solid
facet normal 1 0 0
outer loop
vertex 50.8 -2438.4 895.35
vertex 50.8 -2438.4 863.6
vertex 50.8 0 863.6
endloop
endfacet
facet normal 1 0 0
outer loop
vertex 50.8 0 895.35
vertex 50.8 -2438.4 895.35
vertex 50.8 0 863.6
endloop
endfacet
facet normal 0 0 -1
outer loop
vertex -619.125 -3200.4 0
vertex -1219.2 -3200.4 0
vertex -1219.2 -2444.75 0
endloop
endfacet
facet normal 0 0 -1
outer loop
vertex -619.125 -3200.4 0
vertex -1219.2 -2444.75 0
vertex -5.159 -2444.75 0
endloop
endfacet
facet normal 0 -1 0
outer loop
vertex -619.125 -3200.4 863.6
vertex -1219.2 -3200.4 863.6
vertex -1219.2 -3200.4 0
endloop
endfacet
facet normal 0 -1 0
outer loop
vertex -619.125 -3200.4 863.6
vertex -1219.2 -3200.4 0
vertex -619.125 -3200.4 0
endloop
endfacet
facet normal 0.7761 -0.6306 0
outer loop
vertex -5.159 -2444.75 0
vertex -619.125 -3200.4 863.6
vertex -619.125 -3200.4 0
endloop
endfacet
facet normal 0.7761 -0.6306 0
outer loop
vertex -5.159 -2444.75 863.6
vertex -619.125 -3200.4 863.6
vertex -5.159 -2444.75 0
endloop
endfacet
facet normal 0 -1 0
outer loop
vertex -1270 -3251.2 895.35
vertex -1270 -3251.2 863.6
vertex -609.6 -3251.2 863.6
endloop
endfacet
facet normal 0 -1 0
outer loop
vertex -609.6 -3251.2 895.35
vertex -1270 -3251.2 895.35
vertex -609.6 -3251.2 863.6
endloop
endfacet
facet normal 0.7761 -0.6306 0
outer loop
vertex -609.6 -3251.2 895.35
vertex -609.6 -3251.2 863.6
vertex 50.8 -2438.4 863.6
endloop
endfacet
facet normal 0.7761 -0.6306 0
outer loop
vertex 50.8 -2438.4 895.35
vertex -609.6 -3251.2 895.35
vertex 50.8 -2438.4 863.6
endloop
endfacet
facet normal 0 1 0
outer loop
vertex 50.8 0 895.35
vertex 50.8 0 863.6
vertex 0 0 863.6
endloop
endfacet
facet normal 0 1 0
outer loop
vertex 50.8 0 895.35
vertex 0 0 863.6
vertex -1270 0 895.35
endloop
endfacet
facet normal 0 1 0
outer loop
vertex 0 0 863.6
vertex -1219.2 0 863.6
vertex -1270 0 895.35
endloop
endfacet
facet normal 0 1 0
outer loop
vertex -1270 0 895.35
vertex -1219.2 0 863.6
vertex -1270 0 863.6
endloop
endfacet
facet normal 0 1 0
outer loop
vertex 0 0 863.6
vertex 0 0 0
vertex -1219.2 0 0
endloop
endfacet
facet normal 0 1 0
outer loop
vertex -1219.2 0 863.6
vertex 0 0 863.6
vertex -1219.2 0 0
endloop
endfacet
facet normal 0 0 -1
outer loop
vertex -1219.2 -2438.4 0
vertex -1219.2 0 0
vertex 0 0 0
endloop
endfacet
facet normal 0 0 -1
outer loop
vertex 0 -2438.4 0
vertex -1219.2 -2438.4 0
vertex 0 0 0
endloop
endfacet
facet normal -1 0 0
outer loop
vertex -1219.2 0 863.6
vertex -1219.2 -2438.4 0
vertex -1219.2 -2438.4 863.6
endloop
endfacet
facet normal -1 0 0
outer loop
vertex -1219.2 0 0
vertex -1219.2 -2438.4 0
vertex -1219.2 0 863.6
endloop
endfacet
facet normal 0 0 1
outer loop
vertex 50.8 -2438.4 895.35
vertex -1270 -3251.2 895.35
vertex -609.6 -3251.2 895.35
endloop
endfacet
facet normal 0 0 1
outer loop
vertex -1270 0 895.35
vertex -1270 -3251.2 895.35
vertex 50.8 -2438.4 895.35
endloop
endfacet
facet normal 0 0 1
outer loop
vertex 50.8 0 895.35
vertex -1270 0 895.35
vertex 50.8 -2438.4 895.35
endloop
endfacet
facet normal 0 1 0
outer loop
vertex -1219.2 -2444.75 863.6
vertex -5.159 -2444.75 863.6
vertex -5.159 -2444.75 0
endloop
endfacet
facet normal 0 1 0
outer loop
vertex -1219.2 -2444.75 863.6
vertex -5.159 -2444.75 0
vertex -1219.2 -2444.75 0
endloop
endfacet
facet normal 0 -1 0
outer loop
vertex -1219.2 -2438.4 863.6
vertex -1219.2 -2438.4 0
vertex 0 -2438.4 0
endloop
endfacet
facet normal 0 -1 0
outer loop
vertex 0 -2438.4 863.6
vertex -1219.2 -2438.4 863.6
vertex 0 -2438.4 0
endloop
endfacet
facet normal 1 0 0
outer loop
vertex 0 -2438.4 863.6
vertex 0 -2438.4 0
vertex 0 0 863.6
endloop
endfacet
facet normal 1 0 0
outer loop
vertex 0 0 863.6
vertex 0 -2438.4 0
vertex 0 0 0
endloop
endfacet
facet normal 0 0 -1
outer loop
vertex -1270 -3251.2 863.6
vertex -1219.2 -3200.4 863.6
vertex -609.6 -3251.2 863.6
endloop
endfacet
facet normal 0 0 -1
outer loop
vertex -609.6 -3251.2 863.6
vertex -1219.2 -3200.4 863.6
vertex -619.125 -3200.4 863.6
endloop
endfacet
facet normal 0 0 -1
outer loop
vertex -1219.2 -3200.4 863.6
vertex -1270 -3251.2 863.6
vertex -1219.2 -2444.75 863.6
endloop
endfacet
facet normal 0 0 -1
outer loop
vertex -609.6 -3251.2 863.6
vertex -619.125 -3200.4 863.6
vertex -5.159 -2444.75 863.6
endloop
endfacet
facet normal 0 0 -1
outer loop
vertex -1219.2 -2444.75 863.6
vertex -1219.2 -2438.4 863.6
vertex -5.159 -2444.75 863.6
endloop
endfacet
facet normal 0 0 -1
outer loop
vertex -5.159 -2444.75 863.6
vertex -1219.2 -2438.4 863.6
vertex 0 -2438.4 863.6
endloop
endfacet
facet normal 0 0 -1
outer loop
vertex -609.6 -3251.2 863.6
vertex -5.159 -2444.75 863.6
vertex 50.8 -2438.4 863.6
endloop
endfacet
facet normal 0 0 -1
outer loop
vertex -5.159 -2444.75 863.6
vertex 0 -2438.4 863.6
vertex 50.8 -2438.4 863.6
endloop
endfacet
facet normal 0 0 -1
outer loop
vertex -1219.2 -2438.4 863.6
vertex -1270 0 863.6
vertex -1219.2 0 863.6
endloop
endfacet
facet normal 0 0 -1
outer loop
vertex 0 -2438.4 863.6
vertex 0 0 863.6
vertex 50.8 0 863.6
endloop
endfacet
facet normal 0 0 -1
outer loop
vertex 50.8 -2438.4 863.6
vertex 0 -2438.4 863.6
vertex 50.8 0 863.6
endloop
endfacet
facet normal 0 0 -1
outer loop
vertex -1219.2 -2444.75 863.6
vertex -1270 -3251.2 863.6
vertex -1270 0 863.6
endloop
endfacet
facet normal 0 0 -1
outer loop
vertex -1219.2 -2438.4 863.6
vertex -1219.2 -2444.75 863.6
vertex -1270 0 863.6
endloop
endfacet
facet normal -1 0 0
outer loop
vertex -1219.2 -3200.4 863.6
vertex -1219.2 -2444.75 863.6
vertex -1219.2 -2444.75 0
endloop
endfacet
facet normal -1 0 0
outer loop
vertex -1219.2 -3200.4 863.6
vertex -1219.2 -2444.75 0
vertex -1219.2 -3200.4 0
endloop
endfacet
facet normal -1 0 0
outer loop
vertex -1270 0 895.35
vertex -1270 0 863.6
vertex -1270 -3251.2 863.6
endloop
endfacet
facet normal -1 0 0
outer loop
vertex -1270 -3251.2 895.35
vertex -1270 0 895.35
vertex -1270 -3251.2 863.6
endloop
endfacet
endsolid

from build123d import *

# Parameters (mm, degrees)
F0_W     = 1219.2
F0_H     = 2438.4
F1_DEPTH = 863.6
F2_W     = 50.8
F2_H     = 2438.4
F2_W_2   = 1219.2
F3_DEPTH = 31.75
F5_DEPTH = 31.75
F6_DEPTH = 863.6


with BuildPart() as f1:
    # F0 (on Top) → F1 (new body)
    with BuildSketch(Plane.XY):
        with Locations((-609.6, -1219.2)):
            Rectangle(F0_W, F0_H)
    extrude(amount=F1_DEPTH)

    # F2 (on face) → F3 (join)
    with BuildSketch(Plane.XY.offset(863.6)):
        with Locations((-1244.6, -1219.2)):
            Rectangle(F2_W, F2_H)
        Polygon((-1219.2, -2438.4), (-1270, -2438.4), (-1270, -3251.2), (-609.6, -3251.2), (50.8, -2438.4), (0, -2438.4), align=None)
        with Locations((25.4, -1219.2)):
            Rectangle(F2_W, F2_H)
        with Locations((-609.6, -1219.2)):
            Rectangle(F2_W_2, F2_H)
    extrude(amount=F3_DEPTH)

    # F2 (on face) → F5 (join)
    with BuildSketch(Plane.XY.offset(863.6)):
        with Locations((-609.6, -1219.2)):
            Rectangle(F2_W_2, F2_H)
    extrude(amount=F5_DEPTH)

    # F4 (on face) → F6 (join)
    with BuildSketch(Plane.XY.offset(863.6)):
        Polygon((-619.125, -3200.4), (-5.159375, -2444.75), (-1219.2, -2444.75), (-1219.2, -3200.4), align=None)
    extrude(amount=-F6_DEPTH)


solid = f1.part
